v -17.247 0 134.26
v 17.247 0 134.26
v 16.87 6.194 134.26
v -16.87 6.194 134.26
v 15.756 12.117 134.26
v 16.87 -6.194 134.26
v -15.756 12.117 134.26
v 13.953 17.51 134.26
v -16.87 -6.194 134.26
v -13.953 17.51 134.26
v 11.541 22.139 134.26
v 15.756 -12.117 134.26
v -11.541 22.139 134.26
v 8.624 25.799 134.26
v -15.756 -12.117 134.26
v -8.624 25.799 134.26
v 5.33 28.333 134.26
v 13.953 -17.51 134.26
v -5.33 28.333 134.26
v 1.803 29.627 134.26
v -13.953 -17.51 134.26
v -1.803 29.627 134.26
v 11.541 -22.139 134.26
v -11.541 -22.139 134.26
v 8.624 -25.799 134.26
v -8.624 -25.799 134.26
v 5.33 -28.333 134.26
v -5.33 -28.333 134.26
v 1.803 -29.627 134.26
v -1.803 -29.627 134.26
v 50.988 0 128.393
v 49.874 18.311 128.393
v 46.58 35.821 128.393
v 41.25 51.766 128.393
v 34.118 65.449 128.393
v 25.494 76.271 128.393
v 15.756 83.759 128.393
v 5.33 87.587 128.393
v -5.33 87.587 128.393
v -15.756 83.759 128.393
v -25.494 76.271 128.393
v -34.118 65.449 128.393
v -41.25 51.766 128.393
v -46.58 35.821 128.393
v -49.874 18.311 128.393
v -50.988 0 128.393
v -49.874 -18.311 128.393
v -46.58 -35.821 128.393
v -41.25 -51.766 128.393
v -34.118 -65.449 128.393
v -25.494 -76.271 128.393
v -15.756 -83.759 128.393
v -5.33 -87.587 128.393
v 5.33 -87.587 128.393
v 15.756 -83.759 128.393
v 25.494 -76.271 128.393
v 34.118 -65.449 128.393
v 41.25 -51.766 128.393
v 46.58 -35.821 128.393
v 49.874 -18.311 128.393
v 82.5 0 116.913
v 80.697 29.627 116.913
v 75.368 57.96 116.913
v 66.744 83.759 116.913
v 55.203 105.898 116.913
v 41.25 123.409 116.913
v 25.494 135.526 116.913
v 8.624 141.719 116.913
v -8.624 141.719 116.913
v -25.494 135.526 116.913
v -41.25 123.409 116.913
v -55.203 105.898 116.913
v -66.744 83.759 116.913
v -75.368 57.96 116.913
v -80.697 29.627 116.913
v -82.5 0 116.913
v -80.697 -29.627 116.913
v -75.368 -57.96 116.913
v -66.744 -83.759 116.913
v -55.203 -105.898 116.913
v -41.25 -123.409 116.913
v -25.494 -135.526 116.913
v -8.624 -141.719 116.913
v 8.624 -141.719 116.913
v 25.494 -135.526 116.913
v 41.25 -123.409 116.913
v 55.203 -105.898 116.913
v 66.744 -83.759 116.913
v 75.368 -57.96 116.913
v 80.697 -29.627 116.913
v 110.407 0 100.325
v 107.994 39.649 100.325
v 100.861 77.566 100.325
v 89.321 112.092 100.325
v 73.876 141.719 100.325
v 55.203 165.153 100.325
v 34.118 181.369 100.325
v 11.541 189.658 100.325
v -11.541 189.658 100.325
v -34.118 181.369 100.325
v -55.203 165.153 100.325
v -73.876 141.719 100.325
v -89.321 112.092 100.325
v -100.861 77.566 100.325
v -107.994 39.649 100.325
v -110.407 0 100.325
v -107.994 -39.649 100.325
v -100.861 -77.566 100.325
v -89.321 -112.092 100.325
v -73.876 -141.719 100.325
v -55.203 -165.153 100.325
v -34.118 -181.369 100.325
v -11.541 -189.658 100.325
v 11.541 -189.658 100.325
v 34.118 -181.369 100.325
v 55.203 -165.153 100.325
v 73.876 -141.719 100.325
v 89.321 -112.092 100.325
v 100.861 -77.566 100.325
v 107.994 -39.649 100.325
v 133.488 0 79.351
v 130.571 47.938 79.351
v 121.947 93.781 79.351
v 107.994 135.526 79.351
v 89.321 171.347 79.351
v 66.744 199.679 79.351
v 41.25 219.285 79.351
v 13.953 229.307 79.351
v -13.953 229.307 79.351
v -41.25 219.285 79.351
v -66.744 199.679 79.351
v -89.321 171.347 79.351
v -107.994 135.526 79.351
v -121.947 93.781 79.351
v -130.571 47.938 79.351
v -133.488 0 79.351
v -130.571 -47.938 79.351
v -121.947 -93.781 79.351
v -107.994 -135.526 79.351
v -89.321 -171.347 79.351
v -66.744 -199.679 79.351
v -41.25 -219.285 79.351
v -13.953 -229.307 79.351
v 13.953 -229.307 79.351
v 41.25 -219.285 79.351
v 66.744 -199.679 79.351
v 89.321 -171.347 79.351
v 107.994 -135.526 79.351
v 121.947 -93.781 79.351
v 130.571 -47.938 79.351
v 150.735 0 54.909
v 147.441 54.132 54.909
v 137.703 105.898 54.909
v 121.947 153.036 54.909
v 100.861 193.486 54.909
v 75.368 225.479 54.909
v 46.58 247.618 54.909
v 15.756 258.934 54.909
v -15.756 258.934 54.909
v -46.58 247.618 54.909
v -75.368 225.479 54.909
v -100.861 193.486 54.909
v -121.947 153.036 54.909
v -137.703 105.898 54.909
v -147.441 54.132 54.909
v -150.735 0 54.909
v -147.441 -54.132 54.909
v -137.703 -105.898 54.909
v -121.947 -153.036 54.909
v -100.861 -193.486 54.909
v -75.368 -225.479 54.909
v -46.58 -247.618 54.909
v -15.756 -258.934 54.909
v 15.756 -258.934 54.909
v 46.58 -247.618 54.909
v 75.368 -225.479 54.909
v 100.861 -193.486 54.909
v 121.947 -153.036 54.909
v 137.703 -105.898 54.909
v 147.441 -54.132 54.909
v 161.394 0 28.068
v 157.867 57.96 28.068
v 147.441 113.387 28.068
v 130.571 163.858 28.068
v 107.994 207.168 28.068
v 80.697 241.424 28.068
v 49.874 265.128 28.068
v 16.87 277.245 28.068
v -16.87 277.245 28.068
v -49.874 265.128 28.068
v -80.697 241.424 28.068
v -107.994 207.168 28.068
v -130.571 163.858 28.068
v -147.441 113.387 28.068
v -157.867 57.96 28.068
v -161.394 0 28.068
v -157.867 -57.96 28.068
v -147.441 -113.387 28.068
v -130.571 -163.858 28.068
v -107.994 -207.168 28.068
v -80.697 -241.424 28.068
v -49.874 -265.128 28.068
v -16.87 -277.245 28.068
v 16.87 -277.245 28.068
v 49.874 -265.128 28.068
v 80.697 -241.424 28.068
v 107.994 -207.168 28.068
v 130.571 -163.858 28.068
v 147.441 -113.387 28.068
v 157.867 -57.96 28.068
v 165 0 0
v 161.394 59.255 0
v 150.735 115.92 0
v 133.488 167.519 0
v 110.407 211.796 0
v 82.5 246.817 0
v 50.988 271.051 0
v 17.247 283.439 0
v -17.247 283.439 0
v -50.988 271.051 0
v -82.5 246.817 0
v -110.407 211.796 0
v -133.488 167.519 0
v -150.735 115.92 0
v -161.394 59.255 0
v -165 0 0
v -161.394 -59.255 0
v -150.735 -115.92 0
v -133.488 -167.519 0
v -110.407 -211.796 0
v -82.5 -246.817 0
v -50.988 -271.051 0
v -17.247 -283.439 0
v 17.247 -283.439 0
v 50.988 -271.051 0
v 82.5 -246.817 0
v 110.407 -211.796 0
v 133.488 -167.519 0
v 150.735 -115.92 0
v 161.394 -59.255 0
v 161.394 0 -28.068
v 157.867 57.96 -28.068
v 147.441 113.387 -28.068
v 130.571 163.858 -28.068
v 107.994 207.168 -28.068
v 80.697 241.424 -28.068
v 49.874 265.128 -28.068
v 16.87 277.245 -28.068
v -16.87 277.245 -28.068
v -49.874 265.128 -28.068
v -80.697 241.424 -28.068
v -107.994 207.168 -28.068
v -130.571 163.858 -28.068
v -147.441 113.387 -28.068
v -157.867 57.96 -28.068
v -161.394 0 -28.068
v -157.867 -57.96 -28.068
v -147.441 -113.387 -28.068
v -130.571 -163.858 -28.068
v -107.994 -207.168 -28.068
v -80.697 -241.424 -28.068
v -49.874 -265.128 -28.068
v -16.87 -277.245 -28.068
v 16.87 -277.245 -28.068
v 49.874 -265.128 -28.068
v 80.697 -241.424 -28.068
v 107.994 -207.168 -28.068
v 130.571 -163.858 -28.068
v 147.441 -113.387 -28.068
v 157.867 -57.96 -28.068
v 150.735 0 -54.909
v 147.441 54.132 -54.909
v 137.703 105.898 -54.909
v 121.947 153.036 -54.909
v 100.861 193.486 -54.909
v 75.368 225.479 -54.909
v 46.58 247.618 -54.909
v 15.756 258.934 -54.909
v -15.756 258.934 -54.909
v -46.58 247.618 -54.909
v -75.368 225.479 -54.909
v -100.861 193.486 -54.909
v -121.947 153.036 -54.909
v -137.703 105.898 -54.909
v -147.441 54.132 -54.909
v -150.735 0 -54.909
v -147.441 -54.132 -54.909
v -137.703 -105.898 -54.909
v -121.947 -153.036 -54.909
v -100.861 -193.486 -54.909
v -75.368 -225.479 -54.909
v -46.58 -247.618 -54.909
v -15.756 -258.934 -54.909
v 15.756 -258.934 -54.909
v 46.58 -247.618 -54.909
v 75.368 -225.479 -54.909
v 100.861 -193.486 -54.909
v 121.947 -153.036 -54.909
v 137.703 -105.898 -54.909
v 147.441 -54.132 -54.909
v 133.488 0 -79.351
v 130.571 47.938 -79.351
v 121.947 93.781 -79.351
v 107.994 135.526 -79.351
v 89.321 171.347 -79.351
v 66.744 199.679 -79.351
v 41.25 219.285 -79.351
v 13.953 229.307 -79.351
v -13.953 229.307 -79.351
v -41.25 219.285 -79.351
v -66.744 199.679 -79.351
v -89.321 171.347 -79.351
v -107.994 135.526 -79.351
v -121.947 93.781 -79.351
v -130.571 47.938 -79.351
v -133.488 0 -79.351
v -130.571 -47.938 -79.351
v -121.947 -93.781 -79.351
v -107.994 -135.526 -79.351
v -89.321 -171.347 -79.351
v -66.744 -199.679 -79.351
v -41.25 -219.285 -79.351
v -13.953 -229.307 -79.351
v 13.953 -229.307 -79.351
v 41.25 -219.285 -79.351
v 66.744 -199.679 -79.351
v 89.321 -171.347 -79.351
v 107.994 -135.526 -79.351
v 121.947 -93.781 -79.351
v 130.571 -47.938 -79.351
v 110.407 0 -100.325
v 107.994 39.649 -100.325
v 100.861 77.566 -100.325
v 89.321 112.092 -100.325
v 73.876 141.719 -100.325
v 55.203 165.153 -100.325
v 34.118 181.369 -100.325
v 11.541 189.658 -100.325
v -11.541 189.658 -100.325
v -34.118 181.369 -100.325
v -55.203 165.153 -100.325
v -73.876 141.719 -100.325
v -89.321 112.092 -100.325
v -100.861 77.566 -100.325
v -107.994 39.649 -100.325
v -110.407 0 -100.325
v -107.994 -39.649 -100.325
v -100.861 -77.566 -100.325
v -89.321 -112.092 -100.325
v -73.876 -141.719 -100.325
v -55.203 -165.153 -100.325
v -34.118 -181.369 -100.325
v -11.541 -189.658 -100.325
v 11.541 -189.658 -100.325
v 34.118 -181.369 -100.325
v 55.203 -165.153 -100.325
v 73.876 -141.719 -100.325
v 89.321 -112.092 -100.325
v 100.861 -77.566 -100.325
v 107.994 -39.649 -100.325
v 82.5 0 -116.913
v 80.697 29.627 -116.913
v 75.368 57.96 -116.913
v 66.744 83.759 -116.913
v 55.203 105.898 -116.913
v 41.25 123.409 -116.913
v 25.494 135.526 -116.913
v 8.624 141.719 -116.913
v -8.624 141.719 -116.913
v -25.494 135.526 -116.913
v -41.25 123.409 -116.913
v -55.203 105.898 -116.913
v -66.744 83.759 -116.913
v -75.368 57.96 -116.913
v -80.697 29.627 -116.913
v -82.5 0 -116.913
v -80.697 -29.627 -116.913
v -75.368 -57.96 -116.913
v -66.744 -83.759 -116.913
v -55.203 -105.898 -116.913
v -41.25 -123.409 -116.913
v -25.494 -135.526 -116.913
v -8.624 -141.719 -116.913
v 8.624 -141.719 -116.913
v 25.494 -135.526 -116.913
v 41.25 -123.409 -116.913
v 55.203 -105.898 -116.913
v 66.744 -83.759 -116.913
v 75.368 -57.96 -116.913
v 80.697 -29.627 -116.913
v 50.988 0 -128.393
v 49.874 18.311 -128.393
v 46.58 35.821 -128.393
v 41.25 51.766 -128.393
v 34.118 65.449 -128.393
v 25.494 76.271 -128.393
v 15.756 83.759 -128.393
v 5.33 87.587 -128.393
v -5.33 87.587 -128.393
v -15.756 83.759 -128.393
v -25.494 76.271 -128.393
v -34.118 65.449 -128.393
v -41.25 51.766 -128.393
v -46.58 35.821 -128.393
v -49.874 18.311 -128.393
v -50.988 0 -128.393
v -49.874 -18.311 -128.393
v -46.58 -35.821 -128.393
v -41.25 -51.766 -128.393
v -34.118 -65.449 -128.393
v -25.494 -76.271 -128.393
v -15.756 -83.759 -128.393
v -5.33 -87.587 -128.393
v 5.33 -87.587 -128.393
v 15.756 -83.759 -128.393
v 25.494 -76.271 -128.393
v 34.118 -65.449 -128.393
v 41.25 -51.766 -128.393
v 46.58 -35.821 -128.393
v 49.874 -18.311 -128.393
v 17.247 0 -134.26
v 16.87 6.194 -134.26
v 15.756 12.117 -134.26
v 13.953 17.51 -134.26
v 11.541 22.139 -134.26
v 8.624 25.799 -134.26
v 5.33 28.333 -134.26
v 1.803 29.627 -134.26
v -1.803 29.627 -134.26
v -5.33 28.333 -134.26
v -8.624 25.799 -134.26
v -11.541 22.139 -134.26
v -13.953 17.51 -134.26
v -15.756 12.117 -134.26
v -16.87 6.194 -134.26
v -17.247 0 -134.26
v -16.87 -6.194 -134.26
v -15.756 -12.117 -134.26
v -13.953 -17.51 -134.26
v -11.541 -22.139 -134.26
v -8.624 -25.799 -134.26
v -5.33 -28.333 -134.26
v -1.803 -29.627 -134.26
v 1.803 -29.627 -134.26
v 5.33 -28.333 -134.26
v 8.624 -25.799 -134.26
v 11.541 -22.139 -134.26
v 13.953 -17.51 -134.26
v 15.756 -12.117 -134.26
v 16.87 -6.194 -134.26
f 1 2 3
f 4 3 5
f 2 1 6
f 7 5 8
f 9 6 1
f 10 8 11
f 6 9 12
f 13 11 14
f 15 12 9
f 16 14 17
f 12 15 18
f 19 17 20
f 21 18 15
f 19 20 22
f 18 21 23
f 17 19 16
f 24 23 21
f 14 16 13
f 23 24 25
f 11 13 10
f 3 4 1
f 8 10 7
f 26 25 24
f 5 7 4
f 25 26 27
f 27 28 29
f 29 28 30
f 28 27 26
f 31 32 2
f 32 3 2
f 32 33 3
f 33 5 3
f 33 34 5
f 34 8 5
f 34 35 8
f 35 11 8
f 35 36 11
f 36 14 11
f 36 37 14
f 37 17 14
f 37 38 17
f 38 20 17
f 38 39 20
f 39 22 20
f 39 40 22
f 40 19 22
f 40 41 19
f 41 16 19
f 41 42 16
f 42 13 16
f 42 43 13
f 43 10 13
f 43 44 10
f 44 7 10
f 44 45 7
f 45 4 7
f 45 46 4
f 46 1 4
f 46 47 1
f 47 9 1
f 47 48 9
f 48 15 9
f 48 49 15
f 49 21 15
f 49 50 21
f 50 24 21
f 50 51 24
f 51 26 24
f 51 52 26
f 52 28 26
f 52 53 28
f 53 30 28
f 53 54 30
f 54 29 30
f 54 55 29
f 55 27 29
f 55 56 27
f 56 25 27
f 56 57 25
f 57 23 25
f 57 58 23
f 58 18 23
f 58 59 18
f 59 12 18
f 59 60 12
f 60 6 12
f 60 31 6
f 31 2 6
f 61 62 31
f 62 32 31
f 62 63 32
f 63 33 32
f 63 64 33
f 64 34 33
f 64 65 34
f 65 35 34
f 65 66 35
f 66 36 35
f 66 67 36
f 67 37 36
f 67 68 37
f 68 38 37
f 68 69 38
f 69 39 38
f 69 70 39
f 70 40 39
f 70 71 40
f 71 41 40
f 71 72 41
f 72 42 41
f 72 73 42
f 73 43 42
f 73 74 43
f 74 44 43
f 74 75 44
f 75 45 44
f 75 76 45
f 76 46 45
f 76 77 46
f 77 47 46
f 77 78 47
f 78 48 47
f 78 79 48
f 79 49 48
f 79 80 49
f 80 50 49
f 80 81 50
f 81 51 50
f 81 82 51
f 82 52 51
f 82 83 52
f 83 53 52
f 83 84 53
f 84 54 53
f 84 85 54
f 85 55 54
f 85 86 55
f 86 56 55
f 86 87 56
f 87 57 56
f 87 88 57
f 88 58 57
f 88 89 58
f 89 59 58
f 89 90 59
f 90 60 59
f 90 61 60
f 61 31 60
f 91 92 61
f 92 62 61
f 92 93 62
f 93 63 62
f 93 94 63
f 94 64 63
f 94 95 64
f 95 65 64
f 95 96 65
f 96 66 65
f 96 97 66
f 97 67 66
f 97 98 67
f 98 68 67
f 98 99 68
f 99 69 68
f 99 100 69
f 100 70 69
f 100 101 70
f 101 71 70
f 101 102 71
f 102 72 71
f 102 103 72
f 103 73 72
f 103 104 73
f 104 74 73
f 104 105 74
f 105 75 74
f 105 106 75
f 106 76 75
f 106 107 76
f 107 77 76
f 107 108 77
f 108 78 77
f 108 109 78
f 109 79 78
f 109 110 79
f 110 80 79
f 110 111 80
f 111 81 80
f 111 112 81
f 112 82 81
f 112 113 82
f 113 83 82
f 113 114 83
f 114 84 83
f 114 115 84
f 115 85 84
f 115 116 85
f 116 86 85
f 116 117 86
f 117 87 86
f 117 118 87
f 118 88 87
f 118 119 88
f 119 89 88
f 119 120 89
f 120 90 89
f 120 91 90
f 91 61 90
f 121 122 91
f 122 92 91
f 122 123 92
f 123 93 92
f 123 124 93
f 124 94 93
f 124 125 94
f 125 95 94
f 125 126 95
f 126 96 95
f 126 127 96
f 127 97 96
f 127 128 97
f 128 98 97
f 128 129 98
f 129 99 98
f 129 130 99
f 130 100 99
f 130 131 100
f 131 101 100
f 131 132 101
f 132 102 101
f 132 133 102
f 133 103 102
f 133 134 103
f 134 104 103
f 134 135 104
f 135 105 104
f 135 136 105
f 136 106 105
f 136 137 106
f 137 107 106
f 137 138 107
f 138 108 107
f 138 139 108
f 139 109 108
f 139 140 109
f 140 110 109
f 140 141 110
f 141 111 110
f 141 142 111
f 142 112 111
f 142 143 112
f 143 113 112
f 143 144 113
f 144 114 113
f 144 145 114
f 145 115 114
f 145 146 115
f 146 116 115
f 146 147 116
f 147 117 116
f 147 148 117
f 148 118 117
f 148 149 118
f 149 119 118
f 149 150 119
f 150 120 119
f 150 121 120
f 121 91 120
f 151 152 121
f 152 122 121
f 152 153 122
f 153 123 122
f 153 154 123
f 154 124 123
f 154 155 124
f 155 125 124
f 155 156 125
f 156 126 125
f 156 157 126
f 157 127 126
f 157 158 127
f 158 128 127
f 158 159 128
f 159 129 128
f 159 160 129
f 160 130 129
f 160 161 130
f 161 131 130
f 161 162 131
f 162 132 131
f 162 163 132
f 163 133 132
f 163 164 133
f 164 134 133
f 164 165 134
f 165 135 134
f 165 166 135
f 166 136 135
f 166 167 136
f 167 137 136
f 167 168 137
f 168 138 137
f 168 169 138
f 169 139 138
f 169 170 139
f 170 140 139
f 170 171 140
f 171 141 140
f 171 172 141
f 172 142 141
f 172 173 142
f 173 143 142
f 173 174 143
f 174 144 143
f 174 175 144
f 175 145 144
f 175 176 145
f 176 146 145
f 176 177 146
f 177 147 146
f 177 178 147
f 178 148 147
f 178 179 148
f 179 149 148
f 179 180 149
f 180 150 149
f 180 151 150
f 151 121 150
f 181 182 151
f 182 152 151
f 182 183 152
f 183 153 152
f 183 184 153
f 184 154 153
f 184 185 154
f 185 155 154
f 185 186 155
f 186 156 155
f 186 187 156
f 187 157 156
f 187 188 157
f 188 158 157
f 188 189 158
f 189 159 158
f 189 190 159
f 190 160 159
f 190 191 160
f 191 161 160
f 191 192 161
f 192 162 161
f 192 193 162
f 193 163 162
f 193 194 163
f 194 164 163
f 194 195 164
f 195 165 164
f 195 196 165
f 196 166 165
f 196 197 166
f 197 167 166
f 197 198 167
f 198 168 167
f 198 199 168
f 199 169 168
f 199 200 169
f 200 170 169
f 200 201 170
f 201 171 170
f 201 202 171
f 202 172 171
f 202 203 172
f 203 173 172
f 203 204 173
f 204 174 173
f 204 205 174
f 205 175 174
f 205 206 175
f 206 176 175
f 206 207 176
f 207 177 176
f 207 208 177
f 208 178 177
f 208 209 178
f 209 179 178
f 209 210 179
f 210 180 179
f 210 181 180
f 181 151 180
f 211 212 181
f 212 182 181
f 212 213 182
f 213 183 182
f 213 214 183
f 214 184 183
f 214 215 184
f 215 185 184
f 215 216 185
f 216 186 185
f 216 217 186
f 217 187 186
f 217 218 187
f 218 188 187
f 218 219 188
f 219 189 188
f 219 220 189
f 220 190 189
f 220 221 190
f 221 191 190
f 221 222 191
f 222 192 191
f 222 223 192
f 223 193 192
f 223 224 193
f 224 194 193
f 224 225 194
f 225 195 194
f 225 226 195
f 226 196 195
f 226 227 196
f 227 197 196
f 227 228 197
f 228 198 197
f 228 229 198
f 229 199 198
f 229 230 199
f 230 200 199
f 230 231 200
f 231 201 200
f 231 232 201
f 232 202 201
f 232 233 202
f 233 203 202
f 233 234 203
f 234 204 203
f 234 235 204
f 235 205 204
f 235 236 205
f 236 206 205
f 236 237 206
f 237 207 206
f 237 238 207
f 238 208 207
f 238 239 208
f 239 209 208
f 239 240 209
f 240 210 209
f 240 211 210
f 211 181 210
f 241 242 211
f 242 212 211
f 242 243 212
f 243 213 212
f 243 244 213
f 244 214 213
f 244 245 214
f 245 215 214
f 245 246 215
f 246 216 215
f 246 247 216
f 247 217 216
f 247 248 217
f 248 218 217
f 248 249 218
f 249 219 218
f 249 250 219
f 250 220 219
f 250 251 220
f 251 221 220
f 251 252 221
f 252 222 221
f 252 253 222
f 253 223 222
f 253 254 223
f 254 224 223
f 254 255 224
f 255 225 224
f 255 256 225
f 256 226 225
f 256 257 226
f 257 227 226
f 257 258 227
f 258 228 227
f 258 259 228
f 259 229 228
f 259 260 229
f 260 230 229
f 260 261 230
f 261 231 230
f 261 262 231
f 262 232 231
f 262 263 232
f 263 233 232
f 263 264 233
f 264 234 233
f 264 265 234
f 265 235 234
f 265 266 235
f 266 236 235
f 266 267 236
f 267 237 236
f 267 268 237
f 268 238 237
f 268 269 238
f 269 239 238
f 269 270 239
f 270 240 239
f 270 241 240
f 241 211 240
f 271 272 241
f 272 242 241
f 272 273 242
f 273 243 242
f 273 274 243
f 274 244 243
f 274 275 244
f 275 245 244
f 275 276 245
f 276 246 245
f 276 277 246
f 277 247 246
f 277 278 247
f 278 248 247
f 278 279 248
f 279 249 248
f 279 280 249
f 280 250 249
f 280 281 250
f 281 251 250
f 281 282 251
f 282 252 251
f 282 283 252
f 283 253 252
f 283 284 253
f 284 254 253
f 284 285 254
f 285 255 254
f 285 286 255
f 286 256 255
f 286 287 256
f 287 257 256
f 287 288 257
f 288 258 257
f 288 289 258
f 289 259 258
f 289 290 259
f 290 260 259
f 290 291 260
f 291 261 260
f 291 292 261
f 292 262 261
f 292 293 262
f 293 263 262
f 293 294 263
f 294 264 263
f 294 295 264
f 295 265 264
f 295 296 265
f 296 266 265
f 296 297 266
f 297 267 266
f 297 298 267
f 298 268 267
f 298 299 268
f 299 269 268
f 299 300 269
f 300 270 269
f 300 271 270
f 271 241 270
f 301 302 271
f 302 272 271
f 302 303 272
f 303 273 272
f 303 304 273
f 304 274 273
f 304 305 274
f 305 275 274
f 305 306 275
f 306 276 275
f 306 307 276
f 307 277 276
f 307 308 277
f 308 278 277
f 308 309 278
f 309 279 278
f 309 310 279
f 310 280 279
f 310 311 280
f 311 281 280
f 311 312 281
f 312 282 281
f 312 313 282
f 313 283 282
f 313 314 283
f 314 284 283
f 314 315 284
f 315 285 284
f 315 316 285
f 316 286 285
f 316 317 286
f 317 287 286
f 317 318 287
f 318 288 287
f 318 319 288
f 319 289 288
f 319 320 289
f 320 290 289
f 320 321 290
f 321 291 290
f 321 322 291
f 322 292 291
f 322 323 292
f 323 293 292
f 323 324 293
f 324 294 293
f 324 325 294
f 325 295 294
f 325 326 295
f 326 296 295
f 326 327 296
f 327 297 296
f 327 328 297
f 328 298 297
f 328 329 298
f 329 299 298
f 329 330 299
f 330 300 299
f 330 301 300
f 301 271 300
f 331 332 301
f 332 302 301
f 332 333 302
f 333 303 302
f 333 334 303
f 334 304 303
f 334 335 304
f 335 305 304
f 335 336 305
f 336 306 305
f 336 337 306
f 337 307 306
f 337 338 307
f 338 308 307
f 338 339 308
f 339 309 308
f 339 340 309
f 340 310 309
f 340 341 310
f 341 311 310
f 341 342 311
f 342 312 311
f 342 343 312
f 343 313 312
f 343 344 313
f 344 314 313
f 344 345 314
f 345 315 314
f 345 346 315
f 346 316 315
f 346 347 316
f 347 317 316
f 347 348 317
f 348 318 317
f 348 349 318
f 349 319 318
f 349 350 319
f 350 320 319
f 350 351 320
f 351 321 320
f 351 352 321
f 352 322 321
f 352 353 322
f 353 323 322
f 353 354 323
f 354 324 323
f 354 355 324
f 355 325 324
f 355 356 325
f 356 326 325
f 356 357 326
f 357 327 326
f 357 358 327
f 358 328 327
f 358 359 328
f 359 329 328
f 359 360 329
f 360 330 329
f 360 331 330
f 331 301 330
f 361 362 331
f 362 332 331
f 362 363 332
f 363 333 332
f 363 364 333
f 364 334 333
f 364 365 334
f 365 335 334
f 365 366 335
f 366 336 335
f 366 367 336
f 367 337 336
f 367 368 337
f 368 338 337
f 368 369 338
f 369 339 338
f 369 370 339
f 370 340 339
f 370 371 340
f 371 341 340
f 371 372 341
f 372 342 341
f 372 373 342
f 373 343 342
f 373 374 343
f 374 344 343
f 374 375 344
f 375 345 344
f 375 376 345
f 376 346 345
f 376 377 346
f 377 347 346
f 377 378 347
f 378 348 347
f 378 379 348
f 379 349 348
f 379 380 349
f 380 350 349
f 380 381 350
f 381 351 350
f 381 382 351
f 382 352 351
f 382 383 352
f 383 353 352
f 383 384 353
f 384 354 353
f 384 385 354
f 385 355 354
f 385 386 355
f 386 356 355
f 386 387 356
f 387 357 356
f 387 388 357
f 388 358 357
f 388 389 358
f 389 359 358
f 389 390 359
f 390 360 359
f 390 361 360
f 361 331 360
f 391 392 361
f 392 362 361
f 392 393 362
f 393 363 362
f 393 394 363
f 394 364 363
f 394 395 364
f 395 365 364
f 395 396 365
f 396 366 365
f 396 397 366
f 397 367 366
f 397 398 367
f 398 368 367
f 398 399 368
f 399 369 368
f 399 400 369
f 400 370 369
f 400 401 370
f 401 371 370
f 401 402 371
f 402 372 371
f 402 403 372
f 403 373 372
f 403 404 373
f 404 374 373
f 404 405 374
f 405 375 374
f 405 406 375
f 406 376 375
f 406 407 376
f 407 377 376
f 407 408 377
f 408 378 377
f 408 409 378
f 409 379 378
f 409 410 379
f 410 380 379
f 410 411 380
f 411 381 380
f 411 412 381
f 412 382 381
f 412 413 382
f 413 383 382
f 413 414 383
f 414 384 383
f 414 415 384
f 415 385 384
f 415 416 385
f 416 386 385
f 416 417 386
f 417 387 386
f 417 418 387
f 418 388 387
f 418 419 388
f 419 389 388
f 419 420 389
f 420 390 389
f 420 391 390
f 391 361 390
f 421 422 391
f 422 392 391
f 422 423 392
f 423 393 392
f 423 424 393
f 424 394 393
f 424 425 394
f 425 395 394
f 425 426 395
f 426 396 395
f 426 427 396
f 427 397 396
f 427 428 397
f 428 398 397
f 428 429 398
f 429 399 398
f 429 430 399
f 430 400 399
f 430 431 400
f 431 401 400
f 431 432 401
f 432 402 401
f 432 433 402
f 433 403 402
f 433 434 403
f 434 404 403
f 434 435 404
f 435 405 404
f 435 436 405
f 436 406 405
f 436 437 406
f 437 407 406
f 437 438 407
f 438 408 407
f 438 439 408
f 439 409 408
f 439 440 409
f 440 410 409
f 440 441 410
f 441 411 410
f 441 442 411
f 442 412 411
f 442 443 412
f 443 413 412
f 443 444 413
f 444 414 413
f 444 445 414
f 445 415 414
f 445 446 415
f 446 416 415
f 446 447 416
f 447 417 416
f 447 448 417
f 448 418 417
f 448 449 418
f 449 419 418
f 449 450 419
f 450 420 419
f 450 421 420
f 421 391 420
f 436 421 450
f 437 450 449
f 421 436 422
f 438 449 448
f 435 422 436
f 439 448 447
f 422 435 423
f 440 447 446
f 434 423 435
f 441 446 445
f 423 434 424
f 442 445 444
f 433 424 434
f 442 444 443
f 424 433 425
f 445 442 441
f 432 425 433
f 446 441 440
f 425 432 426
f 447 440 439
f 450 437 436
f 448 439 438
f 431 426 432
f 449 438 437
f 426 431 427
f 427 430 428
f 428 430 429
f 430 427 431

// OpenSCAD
// Generated by SolidPython 1.0.1 on 2020-07-29 00:46:50


scale(v = [11, 19, 9]) {
	sphere(r = 15);
}
/***********************************************
*********      SolidPython code:      **********
************************************************
 
# import packages: SolidPython
from solid import *
from solid.utils import *
from itertools import chain, combinations, permutations


class Resize:

    def __init__(self, scad_file):
        self.scad_file = scad_file
        #self.scad_file = import_scad(scad_file)
        # cone/cylinder param:
        self.r1 = 0
        self.r2 = 0
        self.h = 0
        # rectangular prism param:
        self.w = 0
        self.l = 0
        # ellipse param:
        self.r = 0

    # import OpenScad code (file name corresponds to shape)


    # classify shape + parameters
    def assign(self, param1, param2, param3):
        if self.scad_file == 'cone.scad':
            self.r1 = param1
            self.r2 = param2
            self.h = param3
        elif self.scad_file == 'cylinder.scad':
            self.r1 = param1
            self.r2 = param2
            self.h = param3
        elif self.scad_file == 'rectangularPrism.scad':
            self.h = param1
            self.l = param2
            self.w = param3
        else:
            self.r = param1
            self.h = param2

    # resize parameters
    def iterate(self):
        x = range(3, 20, 2)
        i = 1
        if self.scad_file == 'cone.scad':
            tempList = list(permutations(x, 2))
            for temp in tempList:
                param1 = temp[0]
                param2 = temp[1]
                filepath = 'produced_scad_files/' + 'cone' + str(param1) + '_' + str(param2) + '_' + '.scad'
                scad_render_to_file(cylinder(h=param1, r1=param2, r2=0), filepath)

        elif self.scad_file == 'cylinder.scad':
            tempList = list(permutations(x, 3))
            for temp in tempList:
                param1 = temp[0]
                param2 = temp[1]
                filepath = 'produced_scad_files/' + 'cylinder' + str(param1) + '_' + str(param2) + '_' + '.scad'
                scad_render_to_file(cylinder(h=param1, r1=param2, r2=param2), filepath)

        elif self.scad_file == 'rectangularPrism.scad':
            tempList = list(permutations(x, 3))
            for temp in tempList:
                param1 = temp[0]
                param2 = temp[1]
                param3 = temp[2]
                filepath = 'produced_scad_files/' + 'rectangularPrism' + str(param1) + '_' + str(param2) + '_' + str(
                    param3) + '.scad'
                scad_render_to_file(cube(size=(param1, param2, param3)), filepath)

        elif self.scad_file == 'ellipse.scad':
            tempList = list(permutations(x, 4))
            for temp in tempList:
                param1 = temp[0]
                param2 = temp[1]
                param3 = temp[2]
                param4 = temp[3]
                filepath = 'produced_scad_files/' + 'ellipse' + str(param1) + '_' + str(param2) + '_' + str(param3) + '_' + str(param4) + '.scad'
                scad_render_to_file(scale([param1, param2, param3])(sphere(r=param4)), filepath)

    def render_to_scadfile(self):
        scad_render_to_file(scad, 'example.scad') 
 
************************************************/
